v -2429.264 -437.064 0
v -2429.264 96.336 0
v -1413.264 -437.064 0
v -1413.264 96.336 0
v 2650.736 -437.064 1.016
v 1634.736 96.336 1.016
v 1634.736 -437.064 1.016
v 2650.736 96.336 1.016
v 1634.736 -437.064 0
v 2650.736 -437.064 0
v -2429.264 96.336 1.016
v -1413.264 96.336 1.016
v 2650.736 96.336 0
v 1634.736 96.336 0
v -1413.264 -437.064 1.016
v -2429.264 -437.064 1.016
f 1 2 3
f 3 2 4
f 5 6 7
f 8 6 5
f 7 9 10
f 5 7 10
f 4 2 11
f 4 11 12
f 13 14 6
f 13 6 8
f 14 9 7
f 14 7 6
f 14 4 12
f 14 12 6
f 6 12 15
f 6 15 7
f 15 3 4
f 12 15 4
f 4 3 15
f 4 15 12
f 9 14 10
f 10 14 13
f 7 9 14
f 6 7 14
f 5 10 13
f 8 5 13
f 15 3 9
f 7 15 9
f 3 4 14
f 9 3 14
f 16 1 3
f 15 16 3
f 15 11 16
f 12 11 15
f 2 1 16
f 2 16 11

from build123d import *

# Parameters (mm, degrees)
F0_W     = 3048
F0_H     = 533.4
F1_DEPTH = 1.016
F0_W_2   = 1016
F2_DEPTH = 1.016


with BuildPart() as f1:
    # F0 (on Top) → F1 (new body)
    with BuildSketch(Plane.XY):
        with Locations((110.735954, -170.363741)):
            Rectangle(F0_W, F0_H)
    extrude(amount=F1_DEPTH)


with BuildPart() as f2:
    # F0 (on Top) → F2 (new body)
    with BuildSketch(Plane.XY):
        with Locations((-1921.264046, -170.363741)):
            Rectangle(F0_W_2, F0_H)
        with Locations((2142.735954, -170.363741)):
            Rectangle(F0_W_2, F0_H)
    extrude(amount=F2_DEPTH)


solid = Compound([f1.part, f2.part])
